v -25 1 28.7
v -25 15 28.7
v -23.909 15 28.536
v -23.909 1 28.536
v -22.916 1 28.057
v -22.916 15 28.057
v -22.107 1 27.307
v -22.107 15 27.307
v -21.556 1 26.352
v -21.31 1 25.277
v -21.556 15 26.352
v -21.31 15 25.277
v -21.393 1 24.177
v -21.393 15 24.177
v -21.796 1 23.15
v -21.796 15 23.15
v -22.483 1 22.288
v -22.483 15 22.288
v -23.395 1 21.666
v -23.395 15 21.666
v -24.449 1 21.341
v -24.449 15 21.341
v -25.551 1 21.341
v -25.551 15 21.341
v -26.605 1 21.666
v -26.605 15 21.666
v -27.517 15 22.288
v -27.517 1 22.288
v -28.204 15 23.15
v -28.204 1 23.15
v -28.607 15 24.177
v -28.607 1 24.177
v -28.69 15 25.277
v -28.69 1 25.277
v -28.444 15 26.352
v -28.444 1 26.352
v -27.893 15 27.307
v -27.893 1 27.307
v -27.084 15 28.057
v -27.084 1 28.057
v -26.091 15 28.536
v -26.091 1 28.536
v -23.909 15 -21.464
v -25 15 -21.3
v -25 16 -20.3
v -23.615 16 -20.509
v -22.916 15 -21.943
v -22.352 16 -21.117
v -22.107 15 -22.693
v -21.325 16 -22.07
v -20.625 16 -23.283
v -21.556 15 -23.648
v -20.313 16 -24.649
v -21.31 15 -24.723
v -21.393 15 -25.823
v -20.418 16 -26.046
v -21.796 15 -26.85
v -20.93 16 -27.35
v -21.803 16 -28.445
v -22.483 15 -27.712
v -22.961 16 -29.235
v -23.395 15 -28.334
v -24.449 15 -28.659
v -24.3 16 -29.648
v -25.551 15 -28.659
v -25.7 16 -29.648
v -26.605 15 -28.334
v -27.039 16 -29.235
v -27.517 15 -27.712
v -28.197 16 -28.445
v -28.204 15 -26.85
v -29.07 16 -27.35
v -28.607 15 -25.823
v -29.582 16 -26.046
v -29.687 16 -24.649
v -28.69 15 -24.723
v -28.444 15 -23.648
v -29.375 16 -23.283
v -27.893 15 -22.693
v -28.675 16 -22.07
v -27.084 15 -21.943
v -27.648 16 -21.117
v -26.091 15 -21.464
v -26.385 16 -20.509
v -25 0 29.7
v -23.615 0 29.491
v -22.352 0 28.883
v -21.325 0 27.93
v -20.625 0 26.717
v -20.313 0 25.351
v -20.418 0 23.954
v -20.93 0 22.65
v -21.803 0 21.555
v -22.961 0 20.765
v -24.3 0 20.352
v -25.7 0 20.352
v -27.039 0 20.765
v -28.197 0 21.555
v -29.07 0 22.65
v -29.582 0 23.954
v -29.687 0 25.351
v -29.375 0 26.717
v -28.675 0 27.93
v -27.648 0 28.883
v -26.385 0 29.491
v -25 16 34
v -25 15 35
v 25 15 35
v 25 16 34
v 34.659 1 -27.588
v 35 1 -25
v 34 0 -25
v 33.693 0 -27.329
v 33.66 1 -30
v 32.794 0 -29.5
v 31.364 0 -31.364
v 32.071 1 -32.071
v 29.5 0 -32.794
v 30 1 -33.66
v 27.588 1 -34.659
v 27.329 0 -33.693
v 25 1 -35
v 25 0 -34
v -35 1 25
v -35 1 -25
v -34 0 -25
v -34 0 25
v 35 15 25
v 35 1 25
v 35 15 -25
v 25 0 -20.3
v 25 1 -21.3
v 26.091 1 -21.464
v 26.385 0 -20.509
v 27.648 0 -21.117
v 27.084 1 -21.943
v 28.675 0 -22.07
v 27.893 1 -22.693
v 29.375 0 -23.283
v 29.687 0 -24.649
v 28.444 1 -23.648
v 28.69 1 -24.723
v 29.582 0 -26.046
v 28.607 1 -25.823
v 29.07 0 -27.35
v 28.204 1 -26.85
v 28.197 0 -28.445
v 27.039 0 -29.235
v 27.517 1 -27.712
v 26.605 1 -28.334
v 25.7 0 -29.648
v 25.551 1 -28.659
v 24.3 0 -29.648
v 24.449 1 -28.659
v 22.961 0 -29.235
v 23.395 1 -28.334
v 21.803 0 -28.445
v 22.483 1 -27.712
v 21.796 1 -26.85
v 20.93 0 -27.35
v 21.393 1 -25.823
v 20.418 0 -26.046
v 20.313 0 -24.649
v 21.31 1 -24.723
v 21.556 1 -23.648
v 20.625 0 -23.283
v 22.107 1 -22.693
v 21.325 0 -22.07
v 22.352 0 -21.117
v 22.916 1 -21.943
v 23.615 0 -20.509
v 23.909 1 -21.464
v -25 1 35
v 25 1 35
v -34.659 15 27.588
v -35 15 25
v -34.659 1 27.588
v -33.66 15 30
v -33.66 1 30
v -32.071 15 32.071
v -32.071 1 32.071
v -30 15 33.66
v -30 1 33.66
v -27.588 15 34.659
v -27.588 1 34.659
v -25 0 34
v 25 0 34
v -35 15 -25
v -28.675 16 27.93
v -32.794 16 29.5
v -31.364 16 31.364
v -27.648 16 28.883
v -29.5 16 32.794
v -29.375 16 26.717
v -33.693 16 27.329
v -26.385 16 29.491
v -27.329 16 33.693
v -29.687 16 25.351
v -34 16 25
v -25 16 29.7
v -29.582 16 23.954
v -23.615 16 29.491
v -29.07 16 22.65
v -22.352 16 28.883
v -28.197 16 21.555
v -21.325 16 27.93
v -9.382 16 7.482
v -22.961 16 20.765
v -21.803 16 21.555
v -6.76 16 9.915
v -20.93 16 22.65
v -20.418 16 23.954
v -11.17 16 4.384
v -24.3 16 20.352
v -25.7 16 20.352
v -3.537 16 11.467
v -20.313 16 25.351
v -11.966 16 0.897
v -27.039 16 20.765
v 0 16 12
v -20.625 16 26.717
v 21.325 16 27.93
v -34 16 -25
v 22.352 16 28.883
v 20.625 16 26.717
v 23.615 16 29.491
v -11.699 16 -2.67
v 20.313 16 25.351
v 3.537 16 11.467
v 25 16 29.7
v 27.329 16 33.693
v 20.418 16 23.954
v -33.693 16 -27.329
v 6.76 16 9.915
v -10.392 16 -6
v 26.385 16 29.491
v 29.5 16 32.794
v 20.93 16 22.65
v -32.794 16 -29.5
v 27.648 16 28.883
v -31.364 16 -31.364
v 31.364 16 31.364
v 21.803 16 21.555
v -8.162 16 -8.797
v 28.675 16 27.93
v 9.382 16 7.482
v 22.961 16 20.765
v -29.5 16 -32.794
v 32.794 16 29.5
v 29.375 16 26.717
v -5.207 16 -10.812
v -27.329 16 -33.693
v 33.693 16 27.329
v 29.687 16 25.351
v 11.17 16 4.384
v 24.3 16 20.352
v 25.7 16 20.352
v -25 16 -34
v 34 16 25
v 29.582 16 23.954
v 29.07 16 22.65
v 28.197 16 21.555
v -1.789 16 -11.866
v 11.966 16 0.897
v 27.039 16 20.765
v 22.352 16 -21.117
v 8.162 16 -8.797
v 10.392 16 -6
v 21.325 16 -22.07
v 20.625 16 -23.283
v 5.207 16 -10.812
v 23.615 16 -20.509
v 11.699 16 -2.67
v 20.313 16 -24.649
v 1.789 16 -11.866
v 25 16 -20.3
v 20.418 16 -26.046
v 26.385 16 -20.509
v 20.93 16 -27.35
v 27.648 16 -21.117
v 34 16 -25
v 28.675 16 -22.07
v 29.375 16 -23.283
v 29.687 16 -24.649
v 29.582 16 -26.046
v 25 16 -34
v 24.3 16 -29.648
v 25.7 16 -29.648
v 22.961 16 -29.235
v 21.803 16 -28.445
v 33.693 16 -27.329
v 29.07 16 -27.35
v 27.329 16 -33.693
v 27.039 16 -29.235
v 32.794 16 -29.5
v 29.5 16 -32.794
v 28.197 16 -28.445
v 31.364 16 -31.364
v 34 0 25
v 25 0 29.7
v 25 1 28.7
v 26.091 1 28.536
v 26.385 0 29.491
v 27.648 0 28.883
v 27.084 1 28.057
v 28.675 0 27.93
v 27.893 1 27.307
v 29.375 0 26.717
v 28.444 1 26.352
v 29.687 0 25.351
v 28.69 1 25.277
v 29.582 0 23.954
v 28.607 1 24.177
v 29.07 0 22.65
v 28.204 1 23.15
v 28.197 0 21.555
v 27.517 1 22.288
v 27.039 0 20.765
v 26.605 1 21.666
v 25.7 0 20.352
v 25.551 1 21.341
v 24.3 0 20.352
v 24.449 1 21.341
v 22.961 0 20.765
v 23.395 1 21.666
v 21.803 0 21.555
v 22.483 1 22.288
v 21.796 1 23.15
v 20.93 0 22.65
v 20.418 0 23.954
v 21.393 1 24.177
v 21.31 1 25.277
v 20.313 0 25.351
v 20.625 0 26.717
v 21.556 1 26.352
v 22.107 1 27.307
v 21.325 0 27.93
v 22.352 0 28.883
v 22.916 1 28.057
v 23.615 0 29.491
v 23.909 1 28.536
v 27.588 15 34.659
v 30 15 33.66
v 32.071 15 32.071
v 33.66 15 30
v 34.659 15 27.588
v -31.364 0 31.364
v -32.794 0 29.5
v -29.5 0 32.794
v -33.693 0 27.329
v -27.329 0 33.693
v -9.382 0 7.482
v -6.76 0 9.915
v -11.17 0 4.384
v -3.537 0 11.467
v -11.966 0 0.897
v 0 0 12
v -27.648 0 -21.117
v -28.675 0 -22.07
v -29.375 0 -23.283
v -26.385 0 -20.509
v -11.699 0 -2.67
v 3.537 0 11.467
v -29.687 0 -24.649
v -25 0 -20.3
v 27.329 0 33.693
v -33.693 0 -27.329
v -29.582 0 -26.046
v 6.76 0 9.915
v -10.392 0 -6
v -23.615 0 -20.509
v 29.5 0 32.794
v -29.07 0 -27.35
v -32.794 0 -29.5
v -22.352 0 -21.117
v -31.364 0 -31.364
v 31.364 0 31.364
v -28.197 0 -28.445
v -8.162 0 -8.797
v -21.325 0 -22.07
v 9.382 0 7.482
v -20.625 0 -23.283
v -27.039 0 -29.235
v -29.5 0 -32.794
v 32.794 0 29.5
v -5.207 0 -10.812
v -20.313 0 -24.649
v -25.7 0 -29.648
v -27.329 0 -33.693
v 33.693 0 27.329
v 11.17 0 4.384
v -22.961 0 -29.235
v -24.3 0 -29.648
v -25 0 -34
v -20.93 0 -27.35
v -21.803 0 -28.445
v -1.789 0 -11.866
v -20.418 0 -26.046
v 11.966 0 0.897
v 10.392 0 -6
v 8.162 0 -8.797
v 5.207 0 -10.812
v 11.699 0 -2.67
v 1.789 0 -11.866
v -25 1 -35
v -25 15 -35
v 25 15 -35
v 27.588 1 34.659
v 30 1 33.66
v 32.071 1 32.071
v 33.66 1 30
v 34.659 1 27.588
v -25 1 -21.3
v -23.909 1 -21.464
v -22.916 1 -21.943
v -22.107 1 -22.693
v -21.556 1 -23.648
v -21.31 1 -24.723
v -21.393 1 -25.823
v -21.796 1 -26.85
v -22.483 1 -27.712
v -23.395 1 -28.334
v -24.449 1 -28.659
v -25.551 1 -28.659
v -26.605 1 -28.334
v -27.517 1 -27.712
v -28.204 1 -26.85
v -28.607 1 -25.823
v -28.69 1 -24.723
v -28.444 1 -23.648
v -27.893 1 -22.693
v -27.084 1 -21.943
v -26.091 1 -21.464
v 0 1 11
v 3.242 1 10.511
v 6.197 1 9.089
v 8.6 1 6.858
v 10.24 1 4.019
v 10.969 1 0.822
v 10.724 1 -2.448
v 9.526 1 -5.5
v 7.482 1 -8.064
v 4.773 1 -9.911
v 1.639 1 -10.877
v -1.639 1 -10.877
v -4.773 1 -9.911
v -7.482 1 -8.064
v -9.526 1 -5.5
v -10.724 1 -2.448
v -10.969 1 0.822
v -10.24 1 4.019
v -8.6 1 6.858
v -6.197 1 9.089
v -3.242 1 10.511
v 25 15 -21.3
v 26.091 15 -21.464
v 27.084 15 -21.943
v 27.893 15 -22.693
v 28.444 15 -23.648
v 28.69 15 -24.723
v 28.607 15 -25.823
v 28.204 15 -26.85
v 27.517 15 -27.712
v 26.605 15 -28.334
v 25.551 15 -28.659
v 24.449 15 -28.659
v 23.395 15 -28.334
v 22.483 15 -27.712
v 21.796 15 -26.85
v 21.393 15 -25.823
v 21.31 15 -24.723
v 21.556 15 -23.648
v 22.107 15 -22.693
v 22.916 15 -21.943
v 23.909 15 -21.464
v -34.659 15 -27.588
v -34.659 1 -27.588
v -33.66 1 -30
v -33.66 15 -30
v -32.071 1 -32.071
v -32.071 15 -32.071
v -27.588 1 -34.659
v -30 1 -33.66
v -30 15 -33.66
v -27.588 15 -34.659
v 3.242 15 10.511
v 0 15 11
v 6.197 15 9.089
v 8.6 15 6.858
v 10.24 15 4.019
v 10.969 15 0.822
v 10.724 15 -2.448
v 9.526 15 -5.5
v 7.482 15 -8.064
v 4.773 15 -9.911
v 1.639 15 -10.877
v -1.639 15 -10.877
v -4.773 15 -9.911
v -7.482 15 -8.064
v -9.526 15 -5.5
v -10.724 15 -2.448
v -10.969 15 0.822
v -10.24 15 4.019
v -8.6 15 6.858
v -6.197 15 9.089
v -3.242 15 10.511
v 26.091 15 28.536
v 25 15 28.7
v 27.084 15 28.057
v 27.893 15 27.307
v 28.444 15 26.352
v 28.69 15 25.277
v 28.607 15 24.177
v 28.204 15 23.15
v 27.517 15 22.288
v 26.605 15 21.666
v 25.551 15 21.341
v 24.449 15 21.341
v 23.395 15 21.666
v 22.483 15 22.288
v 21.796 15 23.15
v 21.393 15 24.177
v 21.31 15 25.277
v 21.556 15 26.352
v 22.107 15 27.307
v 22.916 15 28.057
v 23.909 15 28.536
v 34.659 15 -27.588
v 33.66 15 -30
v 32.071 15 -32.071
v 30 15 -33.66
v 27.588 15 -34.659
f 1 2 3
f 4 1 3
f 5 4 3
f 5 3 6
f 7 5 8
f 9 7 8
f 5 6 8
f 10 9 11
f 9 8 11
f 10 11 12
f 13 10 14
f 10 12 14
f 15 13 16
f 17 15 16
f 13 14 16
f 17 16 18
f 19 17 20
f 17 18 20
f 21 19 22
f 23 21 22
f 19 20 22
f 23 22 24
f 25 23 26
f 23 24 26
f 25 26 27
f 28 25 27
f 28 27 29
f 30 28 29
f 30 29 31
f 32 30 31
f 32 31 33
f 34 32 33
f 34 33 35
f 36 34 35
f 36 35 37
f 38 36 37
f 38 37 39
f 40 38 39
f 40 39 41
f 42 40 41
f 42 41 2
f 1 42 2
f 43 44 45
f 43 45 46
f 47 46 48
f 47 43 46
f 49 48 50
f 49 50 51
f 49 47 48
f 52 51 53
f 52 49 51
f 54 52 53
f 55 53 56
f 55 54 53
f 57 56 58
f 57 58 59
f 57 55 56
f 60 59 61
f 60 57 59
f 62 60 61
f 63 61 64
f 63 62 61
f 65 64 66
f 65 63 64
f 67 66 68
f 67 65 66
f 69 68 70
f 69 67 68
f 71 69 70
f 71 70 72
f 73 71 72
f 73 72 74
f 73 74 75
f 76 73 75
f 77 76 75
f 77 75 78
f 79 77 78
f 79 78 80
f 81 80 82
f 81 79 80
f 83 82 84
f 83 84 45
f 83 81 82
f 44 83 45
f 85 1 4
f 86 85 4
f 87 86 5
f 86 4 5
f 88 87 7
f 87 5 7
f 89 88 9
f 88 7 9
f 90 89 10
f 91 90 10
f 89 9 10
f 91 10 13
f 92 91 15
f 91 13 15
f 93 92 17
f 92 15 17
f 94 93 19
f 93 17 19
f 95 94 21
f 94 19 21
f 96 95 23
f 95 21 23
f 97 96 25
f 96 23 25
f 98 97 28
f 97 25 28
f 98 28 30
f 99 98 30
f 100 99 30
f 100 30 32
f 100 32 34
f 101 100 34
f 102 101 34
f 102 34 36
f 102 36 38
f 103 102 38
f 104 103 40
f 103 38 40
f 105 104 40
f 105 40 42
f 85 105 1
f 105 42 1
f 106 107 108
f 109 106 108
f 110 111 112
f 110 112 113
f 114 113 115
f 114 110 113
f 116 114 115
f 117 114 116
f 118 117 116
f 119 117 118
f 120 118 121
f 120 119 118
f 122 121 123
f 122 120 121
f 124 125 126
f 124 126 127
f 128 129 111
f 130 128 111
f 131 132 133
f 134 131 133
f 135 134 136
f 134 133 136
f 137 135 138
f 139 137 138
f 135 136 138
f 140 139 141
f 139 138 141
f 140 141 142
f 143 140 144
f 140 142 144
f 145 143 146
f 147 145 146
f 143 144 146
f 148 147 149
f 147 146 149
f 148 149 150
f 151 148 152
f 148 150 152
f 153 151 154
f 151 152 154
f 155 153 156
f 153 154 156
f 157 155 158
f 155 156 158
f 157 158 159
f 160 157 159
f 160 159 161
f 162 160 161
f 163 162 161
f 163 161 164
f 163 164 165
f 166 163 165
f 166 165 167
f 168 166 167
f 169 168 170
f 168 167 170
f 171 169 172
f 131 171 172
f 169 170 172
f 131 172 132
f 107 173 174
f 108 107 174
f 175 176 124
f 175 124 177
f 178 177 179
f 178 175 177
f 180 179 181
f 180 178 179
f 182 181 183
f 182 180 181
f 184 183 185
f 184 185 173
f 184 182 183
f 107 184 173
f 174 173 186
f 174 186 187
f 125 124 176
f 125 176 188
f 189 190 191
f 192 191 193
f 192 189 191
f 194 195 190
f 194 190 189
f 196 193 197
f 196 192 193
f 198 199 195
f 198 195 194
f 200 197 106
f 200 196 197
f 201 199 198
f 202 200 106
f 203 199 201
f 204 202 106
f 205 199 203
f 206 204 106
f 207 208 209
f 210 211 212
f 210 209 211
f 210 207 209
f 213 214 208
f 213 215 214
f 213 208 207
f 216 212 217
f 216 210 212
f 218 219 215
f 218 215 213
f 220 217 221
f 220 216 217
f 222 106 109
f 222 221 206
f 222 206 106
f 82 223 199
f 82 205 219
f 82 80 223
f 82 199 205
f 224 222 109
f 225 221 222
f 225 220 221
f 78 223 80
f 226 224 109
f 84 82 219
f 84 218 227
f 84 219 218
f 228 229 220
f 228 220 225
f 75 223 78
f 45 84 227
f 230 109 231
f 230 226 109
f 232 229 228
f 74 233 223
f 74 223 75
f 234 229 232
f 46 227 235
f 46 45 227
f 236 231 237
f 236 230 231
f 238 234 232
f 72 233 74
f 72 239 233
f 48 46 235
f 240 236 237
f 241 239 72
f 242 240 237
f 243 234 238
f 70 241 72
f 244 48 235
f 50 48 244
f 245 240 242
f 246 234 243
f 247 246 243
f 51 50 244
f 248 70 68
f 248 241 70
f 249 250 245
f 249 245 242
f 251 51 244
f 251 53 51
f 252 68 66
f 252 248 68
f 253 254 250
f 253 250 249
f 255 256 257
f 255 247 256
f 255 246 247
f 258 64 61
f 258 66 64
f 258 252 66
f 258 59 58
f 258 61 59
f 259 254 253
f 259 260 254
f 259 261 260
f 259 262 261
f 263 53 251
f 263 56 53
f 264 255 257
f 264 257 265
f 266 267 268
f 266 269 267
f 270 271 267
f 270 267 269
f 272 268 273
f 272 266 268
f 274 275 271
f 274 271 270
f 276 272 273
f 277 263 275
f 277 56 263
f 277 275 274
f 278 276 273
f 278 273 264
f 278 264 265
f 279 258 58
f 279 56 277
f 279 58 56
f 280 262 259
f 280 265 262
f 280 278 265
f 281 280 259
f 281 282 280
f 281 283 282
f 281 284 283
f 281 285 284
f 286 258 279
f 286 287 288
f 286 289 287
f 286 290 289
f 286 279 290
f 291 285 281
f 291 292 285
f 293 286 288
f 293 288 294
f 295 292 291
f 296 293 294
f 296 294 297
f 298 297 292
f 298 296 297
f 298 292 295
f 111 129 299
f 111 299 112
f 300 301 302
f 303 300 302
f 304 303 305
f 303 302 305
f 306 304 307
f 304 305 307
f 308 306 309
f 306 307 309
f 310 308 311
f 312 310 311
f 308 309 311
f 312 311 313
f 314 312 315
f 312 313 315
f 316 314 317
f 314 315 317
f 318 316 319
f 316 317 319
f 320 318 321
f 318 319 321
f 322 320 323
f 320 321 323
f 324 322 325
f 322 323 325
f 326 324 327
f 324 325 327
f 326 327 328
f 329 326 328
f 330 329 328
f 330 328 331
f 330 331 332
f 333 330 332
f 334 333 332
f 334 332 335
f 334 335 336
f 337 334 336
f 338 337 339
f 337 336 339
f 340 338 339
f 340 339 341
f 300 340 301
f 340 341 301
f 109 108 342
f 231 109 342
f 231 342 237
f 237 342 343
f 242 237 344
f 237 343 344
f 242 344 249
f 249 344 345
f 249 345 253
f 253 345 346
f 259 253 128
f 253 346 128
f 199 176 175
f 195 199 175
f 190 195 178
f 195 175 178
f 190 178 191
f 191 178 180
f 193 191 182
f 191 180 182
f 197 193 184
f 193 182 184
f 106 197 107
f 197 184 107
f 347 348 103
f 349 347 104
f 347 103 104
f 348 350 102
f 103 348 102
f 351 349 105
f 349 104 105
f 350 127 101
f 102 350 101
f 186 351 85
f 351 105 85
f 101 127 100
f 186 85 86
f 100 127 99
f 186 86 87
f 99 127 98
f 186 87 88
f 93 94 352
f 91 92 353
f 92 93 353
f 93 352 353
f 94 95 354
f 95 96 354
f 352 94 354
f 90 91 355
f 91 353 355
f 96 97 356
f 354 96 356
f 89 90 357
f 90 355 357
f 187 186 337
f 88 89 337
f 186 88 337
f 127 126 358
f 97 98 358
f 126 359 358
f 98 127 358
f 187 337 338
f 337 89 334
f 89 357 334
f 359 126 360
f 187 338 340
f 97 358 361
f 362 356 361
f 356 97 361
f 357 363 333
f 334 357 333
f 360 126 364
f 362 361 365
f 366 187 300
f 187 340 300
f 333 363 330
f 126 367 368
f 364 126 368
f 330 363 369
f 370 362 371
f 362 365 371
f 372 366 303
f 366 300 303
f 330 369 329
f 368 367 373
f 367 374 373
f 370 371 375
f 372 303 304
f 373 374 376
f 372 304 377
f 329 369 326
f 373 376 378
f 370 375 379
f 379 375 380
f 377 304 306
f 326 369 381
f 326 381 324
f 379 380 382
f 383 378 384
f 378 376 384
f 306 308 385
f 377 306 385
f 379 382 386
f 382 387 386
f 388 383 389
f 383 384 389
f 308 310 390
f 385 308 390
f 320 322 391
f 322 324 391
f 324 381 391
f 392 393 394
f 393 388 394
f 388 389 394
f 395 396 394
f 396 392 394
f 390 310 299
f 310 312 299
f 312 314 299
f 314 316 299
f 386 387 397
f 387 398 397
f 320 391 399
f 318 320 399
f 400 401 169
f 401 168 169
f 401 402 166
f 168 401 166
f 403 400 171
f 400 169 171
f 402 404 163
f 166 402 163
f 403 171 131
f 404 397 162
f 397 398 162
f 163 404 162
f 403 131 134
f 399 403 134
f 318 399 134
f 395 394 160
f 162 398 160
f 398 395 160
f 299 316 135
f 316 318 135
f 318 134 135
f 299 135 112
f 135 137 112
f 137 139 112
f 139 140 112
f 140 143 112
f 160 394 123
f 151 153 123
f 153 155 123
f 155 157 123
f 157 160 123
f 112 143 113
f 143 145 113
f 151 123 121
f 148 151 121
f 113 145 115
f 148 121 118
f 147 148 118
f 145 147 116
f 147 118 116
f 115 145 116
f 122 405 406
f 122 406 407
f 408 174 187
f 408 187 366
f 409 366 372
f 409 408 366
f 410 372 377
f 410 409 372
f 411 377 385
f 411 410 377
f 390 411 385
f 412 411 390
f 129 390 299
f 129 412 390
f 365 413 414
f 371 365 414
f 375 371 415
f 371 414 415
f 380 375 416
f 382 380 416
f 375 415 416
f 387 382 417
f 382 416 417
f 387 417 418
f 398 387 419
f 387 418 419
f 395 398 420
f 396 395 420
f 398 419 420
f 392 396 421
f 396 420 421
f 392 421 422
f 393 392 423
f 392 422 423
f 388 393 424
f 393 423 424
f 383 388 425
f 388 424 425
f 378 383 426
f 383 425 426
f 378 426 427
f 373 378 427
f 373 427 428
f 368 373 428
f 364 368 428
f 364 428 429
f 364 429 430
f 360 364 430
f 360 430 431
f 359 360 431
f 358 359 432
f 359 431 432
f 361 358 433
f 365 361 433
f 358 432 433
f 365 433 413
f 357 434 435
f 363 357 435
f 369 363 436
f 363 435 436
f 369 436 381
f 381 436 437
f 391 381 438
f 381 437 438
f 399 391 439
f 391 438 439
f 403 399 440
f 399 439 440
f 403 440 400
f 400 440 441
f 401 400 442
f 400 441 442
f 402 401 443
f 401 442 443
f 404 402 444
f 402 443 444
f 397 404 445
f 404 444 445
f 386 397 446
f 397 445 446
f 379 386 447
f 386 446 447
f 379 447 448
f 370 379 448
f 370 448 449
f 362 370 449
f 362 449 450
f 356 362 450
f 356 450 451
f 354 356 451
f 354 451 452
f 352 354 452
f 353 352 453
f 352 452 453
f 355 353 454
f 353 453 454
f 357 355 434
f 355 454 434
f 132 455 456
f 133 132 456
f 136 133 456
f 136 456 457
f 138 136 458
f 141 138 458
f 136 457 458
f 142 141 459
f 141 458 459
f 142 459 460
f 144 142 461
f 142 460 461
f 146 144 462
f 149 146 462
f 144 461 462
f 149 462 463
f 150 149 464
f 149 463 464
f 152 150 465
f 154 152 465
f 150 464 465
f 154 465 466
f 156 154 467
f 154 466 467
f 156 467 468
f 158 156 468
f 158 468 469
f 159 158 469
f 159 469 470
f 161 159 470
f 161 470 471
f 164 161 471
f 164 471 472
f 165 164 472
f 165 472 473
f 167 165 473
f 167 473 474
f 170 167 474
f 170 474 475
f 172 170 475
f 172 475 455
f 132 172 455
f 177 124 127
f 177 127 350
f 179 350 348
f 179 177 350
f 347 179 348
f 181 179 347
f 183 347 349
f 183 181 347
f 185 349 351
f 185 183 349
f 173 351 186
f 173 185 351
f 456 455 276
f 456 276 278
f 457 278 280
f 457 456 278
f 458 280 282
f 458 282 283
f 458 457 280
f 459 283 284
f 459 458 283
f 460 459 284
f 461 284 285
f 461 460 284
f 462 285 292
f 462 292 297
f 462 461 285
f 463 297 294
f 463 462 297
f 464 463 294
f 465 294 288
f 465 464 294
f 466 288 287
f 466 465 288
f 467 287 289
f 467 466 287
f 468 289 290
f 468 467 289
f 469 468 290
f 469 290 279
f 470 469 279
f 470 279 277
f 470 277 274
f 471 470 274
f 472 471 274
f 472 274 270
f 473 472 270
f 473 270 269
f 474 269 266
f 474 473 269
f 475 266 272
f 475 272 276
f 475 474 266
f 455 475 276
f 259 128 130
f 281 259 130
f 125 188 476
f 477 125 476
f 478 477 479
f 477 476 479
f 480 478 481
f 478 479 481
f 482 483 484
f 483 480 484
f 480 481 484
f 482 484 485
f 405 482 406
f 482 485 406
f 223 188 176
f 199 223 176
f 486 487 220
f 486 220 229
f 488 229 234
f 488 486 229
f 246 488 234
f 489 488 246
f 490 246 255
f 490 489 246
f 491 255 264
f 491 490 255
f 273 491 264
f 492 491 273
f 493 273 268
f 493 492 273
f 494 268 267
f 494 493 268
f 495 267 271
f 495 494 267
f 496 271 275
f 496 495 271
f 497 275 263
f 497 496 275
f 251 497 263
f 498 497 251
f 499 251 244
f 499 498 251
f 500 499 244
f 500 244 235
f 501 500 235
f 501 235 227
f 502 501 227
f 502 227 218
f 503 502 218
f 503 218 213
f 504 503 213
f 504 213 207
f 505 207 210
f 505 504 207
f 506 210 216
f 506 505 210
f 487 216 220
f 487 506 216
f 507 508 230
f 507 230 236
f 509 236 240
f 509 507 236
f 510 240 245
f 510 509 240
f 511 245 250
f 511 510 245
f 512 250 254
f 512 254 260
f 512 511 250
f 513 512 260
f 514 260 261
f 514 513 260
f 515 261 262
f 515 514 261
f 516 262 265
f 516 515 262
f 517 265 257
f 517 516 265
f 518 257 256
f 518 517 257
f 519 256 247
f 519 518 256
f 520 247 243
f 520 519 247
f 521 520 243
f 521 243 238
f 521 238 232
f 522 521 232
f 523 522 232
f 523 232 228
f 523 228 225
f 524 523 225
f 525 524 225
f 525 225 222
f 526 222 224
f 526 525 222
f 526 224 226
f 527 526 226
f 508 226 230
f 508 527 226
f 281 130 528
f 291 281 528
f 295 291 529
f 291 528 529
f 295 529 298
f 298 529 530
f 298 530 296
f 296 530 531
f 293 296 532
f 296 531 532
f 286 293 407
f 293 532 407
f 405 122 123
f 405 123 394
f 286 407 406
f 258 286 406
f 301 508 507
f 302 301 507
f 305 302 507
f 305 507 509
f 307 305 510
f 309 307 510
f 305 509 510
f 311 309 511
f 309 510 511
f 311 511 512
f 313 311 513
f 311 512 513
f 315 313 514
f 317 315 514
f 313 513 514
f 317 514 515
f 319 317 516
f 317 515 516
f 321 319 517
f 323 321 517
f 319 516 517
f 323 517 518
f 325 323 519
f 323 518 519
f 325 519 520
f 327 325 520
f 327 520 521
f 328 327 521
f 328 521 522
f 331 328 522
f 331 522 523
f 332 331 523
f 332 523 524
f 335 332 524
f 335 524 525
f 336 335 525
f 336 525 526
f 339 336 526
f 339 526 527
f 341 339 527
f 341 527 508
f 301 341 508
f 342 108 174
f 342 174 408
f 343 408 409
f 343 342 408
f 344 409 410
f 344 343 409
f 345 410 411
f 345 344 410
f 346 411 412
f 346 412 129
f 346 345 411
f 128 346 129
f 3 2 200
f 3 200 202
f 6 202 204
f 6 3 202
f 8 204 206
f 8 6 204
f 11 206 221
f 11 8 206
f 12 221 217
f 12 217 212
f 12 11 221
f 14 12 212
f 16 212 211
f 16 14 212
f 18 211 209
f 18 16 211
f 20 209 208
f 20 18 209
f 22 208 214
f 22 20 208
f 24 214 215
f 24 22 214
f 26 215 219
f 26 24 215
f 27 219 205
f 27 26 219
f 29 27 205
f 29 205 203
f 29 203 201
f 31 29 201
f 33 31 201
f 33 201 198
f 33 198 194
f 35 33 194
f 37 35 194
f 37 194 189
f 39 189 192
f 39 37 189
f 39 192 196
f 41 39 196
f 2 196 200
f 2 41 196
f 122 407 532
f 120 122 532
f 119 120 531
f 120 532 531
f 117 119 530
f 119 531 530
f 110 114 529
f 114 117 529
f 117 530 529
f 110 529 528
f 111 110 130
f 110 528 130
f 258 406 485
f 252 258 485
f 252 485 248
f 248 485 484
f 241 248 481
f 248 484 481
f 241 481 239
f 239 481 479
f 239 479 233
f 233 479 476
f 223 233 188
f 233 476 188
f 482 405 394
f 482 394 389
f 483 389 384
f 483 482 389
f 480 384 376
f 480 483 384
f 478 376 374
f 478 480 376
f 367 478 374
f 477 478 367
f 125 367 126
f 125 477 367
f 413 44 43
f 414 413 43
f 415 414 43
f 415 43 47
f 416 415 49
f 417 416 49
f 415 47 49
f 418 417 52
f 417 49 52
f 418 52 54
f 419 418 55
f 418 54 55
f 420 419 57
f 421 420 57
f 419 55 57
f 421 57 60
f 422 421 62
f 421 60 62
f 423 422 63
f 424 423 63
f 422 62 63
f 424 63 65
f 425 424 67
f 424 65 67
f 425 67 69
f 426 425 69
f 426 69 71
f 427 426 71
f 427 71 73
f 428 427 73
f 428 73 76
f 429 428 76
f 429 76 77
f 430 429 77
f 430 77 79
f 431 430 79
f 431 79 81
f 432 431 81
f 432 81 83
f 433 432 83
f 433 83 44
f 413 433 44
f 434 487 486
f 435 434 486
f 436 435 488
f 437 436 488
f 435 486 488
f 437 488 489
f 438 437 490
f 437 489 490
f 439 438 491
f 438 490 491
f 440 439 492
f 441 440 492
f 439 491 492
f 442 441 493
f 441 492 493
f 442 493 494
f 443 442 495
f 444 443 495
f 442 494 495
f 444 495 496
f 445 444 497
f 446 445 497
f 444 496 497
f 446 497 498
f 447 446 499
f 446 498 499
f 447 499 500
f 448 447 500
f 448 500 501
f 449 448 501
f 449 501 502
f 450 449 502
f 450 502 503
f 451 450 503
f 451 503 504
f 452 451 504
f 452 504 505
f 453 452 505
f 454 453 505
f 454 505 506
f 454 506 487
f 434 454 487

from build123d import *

# Parameters (mm, degrees)
SKETCH_1_W          = 70
SKETCH_1_H          = 70
EXTRUDE_1_DEPTH     = 16
SKETCH_2_R          = 11
SKETCH_2_R_2        = 3.7
CUT_EXTRUDE_1_DEPTH = 53.019227215
FILLET_1_R          = 10
CHAMFER_1_SIZE      = 1


with BuildPart() as part:
    # Эскиз1 → Бобышка-Вытянуть1 (new body)
    with BuildSketch(Plane(origin=(0, 0, 0), x_dir=(1, 0, 0), z_dir=(0, 1, 0))):
        Rectangle(SKETCH_1_W, SKETCH_1_H)
    extrude(amount=EXTRUDE_1_DEPTH)

    # Эскиз2 → Вырез-Вытянуть1 (cut, through all)
    with BuildSketch(Plane(origin=(0, 16, 0), x_dir=(1, 0, 0), z_dir=(0, 1, 0))):
        with Locations(Location((0, 0, 0), (0, 0, 270))):
            Circle(SKETCH_2_R)
        with Locations(Location((-25, 25, 0), (0, 0, 270))):
            Circle(SKETCH_2_R_2)
        with Locations(Location((25, 25, 0), (0, 0, 270))):
            Circle(SKETCH_2_R_2)
        with Locations(Location((25, -25, 0), (0, 0, 270))):
            Circle(SKETCH_2_R_2)
        with Locations(Location((-25, -25, 0), (0, 0, 270))):
            Circle(SKETCH_2_R_2)
    extrude(amount=-CUT_EXTRUDE_1_DEPTH, mode=Mode.SUBTRACT)

    # Скругление1
    fillet_1_edges = [part.edges().sort_by_distance(p)[0] for p in [
        (35, 8, 35),
        (-35, 8, 35),
        (-35, 8, -35),
        (35, 8, -35),
    ]]
    fillet(fillet_1_edges, radius=FILLET_1_R)

    # Фаска1
    chamfer_1_edges = [part.edges().sort_by_distance(p)[0] for p in [
        (-25, 0, 21.3),
        (-25, 16, 21.3),
        (25, 0, 21.3),
        (25, 16, 21.3),
        (25, 0, -28.7),
        (25, 16, -28.7),
        (-25, 0, -28.7),
        (-25, 16, -28.7),
        (0, 0, -11),
        (0, 16, -11),
        (0, 0, 35),
        (0, 16, 35),
        (35, 0, 0),
        (-35, 0, 0),
        (0, 0, -35),
        (32.071067812, 0, -32.071067812),
        (32.071067812, 0, 32.071067812),
        (-32.071067812, 0, -32.071067812),
        (-32.071067812, 0, 32.071067812),
        (-35, 16, 0),
        (35, 16, 0),
        (0, 16, -35),
        (32.071067812, 16, -32.071067812),
        (32.071067812, 16, 32.071067812),
        (-32.071067812, 16, -32.071067812),
        (-32.071067812, 16, 32.071067812),
    ]]
    chamfer(chamfer_1_edges, length=CHAMFER_1_SIZE)


solid = part.part
